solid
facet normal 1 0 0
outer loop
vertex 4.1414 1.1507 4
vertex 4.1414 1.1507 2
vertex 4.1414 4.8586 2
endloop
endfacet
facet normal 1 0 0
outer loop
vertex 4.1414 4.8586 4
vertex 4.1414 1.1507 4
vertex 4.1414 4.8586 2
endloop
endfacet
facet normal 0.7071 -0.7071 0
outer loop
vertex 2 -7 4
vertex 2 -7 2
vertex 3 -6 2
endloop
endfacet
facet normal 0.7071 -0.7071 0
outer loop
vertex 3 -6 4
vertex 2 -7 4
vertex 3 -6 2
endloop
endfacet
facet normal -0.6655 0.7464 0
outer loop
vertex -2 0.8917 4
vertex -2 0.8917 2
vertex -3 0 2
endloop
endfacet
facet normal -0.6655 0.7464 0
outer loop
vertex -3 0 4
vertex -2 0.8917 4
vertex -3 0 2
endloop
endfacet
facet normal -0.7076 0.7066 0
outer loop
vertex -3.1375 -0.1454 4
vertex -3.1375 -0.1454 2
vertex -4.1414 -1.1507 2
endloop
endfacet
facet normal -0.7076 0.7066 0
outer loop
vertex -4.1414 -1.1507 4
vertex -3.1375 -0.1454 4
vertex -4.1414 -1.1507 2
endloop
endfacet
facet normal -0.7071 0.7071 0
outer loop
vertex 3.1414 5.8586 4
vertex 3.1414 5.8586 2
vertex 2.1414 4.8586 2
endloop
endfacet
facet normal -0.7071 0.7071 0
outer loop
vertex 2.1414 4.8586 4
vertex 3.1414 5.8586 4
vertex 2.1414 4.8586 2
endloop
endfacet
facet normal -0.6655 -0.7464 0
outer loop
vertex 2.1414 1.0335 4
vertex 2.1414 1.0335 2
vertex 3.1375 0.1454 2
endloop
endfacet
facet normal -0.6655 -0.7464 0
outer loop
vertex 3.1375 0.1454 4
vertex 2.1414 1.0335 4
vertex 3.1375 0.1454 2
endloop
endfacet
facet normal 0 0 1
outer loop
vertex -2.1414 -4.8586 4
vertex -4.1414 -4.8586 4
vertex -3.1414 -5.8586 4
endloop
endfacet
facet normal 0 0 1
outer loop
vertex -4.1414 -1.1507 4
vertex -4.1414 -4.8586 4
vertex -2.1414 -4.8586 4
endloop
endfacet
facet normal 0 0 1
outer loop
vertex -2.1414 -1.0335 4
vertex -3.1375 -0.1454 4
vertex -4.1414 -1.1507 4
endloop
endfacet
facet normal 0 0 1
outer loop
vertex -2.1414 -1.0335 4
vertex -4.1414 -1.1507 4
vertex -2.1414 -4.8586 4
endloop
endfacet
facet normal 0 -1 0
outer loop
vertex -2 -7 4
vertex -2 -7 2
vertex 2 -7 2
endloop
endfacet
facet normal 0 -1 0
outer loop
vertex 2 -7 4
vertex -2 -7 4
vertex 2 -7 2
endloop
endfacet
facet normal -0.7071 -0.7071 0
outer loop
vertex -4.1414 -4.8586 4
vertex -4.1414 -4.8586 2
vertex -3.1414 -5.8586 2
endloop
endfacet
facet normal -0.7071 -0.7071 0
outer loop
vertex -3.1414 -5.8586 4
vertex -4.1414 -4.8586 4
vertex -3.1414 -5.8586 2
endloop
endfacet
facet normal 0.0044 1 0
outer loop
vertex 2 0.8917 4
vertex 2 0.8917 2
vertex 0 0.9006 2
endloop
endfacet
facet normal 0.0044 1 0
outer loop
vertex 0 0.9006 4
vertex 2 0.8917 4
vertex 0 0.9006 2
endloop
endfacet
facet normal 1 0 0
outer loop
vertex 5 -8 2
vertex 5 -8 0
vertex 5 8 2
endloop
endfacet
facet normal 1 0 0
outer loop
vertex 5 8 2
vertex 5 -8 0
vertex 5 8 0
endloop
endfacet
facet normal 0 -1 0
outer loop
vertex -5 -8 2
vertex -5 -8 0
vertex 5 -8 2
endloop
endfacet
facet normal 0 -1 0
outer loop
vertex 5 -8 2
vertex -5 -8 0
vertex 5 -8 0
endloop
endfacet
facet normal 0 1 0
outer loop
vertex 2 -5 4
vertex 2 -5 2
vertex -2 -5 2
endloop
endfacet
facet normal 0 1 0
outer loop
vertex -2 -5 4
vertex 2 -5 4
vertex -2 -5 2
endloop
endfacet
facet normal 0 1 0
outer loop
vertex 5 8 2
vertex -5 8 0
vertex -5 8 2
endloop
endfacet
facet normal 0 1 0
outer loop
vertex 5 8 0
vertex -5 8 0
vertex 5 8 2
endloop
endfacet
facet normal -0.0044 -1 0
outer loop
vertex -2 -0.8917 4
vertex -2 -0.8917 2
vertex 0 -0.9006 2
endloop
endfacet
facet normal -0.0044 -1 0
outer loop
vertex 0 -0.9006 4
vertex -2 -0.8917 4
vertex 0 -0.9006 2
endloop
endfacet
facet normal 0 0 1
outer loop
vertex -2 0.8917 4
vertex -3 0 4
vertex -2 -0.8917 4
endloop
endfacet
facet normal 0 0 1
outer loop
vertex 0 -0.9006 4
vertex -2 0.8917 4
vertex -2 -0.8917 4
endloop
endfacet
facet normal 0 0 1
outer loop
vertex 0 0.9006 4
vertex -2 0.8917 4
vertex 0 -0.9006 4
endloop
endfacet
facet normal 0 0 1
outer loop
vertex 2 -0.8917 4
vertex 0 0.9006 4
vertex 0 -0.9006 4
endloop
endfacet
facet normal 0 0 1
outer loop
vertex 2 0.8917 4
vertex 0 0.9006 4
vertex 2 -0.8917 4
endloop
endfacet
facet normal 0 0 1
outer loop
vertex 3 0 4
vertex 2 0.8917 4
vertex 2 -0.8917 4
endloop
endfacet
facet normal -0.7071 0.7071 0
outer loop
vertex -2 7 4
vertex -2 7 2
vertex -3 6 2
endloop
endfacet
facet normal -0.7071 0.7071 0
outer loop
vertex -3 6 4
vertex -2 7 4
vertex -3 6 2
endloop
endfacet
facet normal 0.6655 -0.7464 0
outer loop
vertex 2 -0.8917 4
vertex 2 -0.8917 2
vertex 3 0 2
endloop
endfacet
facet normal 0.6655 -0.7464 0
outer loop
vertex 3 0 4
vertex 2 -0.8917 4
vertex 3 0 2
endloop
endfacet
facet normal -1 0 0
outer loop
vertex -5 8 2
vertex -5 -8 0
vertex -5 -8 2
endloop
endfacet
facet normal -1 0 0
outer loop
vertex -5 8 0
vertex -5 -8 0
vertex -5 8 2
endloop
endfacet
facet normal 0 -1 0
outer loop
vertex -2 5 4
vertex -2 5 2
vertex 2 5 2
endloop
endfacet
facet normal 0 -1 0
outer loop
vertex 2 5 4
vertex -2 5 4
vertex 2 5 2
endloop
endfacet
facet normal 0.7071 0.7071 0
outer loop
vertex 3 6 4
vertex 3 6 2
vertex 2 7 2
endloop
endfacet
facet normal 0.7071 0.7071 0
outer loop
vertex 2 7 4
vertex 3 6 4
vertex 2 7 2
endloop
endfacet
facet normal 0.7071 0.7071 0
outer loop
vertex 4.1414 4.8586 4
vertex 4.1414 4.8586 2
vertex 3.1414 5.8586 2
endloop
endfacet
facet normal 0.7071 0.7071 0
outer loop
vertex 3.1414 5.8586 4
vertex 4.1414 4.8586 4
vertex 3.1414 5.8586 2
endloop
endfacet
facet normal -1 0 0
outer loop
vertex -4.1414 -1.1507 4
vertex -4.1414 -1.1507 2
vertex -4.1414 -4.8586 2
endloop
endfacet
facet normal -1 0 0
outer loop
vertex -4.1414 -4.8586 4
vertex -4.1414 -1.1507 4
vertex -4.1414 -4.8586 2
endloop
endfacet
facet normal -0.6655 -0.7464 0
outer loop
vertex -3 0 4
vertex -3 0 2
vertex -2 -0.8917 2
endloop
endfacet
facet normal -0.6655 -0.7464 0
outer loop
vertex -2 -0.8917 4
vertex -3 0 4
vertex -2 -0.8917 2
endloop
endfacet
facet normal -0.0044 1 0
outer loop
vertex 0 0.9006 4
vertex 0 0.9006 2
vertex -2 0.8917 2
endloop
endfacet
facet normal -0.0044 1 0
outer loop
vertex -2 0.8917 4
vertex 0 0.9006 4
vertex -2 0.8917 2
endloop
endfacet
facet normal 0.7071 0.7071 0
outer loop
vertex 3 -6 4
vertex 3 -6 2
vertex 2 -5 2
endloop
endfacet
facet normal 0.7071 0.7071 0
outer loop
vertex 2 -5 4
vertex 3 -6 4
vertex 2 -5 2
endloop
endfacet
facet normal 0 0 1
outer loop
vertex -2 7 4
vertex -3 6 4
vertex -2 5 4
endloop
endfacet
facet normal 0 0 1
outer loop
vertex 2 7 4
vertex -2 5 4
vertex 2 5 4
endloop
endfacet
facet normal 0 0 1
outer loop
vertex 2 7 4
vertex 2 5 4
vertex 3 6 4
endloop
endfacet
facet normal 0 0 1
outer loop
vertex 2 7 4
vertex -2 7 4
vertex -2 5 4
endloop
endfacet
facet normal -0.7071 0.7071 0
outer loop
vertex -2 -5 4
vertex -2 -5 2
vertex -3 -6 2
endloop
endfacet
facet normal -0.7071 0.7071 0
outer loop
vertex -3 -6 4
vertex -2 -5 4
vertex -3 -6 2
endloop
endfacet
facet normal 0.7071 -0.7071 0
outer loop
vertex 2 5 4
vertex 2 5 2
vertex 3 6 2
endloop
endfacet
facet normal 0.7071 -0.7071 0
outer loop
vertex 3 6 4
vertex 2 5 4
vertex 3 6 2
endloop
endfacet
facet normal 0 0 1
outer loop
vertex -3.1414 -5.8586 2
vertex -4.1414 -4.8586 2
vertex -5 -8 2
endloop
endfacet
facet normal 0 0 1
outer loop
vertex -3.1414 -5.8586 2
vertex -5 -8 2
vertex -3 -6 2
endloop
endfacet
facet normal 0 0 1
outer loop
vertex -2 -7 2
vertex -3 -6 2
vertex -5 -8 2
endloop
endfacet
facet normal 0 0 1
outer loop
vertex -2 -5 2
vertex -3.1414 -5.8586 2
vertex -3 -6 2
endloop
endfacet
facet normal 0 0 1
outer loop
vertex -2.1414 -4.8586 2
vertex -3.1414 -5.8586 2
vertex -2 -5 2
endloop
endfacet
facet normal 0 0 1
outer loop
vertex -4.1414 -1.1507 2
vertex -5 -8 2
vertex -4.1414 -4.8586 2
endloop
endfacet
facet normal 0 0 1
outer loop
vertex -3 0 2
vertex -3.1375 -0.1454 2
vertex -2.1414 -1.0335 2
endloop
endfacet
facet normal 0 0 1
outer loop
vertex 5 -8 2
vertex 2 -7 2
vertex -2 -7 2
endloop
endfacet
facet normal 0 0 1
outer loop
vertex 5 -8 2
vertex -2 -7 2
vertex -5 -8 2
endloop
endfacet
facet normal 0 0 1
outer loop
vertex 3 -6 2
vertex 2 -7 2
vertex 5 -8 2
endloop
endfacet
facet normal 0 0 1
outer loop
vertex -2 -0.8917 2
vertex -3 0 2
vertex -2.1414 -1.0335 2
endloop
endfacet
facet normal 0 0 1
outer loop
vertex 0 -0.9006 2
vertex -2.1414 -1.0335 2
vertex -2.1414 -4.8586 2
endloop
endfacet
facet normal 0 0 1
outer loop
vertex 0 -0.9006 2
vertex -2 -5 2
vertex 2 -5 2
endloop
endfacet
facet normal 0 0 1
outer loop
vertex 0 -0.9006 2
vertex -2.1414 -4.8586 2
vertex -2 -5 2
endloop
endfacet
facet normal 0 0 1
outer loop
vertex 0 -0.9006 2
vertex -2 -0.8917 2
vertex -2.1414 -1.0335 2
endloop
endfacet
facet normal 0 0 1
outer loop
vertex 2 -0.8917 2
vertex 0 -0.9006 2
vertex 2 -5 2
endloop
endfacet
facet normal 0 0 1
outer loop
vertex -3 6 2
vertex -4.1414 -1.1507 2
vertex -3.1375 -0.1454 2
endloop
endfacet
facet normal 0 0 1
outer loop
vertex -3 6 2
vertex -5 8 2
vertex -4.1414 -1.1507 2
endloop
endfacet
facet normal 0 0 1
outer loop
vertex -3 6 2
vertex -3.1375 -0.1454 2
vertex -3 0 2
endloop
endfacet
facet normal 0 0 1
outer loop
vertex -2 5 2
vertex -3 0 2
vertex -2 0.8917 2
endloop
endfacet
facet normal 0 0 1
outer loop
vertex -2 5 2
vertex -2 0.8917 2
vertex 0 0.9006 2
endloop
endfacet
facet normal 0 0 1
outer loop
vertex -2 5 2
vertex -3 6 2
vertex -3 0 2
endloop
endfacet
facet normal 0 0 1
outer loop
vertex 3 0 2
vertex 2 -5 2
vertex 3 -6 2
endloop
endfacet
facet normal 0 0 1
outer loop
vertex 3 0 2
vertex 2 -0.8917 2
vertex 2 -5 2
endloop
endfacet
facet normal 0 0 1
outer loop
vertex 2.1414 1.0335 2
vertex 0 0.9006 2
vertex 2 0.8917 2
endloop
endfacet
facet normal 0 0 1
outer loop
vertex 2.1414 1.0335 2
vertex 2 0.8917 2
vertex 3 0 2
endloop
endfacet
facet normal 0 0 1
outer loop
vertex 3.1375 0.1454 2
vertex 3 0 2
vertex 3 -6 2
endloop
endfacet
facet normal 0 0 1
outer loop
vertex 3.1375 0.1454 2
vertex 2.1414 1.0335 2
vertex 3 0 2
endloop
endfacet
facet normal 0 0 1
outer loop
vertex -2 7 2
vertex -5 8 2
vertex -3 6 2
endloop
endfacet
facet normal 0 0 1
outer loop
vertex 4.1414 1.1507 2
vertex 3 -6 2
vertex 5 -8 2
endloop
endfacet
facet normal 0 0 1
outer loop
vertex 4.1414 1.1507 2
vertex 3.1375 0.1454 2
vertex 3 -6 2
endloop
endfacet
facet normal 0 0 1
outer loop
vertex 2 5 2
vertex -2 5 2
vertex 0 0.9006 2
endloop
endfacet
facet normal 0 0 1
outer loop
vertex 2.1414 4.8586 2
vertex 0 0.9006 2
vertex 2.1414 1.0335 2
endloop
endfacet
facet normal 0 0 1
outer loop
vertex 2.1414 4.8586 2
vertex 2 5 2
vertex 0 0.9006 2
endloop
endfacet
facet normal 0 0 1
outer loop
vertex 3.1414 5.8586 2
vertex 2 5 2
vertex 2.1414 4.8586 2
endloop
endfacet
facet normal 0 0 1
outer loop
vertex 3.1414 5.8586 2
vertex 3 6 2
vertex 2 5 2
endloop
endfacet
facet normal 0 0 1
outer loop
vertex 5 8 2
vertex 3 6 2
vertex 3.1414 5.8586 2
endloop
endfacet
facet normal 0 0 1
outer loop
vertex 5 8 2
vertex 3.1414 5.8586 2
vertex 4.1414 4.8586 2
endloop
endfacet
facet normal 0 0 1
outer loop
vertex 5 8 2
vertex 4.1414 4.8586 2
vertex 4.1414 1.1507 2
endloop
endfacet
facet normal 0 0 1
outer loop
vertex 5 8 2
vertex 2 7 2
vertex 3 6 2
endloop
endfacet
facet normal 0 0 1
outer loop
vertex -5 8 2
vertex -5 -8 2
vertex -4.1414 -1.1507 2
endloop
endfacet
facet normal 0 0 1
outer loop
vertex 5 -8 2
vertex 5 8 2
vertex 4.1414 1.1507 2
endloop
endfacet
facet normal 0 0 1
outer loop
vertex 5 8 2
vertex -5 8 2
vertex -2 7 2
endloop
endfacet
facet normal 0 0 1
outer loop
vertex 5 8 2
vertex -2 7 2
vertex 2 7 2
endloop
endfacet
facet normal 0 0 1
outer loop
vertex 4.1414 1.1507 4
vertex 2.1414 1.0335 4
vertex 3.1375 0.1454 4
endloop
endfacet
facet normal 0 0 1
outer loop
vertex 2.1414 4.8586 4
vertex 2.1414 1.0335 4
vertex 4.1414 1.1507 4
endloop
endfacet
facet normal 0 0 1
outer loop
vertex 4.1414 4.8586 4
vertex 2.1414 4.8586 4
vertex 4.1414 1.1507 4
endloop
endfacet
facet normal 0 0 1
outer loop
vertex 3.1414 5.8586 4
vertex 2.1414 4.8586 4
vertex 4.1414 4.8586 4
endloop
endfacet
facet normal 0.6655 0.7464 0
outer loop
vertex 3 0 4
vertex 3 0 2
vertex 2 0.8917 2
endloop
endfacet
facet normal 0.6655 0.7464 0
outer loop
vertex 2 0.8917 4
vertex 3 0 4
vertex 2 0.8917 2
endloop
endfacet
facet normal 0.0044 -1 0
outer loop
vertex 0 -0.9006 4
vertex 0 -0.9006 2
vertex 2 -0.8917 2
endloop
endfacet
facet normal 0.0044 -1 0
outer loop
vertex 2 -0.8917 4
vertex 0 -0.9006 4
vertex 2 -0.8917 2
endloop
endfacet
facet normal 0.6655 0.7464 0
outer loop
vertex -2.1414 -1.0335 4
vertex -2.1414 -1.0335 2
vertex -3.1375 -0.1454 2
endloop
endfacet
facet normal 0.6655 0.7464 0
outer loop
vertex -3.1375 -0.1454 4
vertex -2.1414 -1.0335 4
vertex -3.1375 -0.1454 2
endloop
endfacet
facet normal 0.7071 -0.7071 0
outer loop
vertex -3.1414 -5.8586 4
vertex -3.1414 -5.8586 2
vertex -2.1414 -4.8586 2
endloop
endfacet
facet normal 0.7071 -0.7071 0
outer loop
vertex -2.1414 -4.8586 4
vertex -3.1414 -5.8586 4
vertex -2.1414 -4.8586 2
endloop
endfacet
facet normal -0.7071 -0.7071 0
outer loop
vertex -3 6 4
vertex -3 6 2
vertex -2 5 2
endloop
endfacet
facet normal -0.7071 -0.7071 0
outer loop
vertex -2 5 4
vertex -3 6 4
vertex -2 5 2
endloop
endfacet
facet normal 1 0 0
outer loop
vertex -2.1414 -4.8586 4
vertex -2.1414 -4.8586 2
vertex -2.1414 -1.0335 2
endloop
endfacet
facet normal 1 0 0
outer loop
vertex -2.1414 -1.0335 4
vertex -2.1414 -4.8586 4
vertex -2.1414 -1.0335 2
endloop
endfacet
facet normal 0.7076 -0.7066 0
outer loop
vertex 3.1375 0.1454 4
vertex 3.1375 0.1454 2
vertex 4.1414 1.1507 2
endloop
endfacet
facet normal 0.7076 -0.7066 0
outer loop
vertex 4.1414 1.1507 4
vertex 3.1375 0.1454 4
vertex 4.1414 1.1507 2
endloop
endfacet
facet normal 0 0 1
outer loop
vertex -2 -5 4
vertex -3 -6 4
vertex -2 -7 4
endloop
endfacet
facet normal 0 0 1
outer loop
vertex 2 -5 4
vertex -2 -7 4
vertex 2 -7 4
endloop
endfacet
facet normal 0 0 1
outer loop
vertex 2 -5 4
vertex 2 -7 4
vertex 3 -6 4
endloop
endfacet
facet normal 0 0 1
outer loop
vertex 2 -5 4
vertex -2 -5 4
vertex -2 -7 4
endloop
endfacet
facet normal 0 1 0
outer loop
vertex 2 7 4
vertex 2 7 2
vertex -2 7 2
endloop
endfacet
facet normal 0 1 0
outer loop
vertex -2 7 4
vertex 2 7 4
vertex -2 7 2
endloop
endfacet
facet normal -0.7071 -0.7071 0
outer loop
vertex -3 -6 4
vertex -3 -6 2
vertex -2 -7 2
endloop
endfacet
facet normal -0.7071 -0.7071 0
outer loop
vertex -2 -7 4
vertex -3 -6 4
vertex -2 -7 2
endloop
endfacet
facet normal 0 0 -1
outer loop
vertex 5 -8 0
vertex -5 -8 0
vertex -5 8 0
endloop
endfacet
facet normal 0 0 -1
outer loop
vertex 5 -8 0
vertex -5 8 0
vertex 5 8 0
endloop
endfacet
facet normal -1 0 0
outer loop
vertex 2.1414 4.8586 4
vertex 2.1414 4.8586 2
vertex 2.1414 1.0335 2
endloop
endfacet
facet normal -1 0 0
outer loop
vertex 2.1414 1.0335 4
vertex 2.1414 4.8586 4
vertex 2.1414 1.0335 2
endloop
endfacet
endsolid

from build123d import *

# Parameters (mm, degrees)
F0_W     = 10
F0_H     = 16
F1_DEPTH = 2
F3_DEPTH = 2


# Not quite as in the source:
# - ends of sketch curves that miss each other by under 0.0002 mm in the source are joined


with BuildPart() as f1:
    # F0 (on Top) → F1 (new body)
    with BuildSketch(Plane.XY):
        Rectangle(F0_W, F0_H)
    extrude(amount=F1_DEPTH)

    # F2 (on face) → F3 (join)
    with BuildSketch(Plane.XY.offset(2)):
        Polygon((0, 7), (-2, 7), (-3, 6), (-2, 5), (0, 5), (2, 5), (3, 6), (2, 7), align=None)
        Polygon((2, 0.891659756), (2.00782e-05, 0.9006214721), (-2, 0.891659756), (-3, 0), (-2, -0.891659756), (-2.00782e-05, -0.9006214721), (2, -0.891659756), (3, 0), align=None)
        Polygon((0, -5), (-2, -5), (-3, -6), (-2, -7), (0, -7), (2, -7), (3, -6), (2, -5), align=None)
        Polygon((-4.1414213562, -4.8585786438), (-3.1414213562, -5.8585786438), (-2.1414213562, -4.8585786438), (-2.1414213562, -1.0335195075), (-3.1374518146, -0.1453992321), (-4.1414213562, -1.1507223826), align=None)
        Polygon((4.1414213562, 4.8585786438), (3.1414213562, 5.8585786438), (2.1414213562, 4.8585786438), (2.1414213562, 1.0335195075), (3.1374518146, 0.1453992321), (4.1414213562, 1.1507223826), align=None)
    extrude(amount=F3_DEPTH)


solid = f1.part
